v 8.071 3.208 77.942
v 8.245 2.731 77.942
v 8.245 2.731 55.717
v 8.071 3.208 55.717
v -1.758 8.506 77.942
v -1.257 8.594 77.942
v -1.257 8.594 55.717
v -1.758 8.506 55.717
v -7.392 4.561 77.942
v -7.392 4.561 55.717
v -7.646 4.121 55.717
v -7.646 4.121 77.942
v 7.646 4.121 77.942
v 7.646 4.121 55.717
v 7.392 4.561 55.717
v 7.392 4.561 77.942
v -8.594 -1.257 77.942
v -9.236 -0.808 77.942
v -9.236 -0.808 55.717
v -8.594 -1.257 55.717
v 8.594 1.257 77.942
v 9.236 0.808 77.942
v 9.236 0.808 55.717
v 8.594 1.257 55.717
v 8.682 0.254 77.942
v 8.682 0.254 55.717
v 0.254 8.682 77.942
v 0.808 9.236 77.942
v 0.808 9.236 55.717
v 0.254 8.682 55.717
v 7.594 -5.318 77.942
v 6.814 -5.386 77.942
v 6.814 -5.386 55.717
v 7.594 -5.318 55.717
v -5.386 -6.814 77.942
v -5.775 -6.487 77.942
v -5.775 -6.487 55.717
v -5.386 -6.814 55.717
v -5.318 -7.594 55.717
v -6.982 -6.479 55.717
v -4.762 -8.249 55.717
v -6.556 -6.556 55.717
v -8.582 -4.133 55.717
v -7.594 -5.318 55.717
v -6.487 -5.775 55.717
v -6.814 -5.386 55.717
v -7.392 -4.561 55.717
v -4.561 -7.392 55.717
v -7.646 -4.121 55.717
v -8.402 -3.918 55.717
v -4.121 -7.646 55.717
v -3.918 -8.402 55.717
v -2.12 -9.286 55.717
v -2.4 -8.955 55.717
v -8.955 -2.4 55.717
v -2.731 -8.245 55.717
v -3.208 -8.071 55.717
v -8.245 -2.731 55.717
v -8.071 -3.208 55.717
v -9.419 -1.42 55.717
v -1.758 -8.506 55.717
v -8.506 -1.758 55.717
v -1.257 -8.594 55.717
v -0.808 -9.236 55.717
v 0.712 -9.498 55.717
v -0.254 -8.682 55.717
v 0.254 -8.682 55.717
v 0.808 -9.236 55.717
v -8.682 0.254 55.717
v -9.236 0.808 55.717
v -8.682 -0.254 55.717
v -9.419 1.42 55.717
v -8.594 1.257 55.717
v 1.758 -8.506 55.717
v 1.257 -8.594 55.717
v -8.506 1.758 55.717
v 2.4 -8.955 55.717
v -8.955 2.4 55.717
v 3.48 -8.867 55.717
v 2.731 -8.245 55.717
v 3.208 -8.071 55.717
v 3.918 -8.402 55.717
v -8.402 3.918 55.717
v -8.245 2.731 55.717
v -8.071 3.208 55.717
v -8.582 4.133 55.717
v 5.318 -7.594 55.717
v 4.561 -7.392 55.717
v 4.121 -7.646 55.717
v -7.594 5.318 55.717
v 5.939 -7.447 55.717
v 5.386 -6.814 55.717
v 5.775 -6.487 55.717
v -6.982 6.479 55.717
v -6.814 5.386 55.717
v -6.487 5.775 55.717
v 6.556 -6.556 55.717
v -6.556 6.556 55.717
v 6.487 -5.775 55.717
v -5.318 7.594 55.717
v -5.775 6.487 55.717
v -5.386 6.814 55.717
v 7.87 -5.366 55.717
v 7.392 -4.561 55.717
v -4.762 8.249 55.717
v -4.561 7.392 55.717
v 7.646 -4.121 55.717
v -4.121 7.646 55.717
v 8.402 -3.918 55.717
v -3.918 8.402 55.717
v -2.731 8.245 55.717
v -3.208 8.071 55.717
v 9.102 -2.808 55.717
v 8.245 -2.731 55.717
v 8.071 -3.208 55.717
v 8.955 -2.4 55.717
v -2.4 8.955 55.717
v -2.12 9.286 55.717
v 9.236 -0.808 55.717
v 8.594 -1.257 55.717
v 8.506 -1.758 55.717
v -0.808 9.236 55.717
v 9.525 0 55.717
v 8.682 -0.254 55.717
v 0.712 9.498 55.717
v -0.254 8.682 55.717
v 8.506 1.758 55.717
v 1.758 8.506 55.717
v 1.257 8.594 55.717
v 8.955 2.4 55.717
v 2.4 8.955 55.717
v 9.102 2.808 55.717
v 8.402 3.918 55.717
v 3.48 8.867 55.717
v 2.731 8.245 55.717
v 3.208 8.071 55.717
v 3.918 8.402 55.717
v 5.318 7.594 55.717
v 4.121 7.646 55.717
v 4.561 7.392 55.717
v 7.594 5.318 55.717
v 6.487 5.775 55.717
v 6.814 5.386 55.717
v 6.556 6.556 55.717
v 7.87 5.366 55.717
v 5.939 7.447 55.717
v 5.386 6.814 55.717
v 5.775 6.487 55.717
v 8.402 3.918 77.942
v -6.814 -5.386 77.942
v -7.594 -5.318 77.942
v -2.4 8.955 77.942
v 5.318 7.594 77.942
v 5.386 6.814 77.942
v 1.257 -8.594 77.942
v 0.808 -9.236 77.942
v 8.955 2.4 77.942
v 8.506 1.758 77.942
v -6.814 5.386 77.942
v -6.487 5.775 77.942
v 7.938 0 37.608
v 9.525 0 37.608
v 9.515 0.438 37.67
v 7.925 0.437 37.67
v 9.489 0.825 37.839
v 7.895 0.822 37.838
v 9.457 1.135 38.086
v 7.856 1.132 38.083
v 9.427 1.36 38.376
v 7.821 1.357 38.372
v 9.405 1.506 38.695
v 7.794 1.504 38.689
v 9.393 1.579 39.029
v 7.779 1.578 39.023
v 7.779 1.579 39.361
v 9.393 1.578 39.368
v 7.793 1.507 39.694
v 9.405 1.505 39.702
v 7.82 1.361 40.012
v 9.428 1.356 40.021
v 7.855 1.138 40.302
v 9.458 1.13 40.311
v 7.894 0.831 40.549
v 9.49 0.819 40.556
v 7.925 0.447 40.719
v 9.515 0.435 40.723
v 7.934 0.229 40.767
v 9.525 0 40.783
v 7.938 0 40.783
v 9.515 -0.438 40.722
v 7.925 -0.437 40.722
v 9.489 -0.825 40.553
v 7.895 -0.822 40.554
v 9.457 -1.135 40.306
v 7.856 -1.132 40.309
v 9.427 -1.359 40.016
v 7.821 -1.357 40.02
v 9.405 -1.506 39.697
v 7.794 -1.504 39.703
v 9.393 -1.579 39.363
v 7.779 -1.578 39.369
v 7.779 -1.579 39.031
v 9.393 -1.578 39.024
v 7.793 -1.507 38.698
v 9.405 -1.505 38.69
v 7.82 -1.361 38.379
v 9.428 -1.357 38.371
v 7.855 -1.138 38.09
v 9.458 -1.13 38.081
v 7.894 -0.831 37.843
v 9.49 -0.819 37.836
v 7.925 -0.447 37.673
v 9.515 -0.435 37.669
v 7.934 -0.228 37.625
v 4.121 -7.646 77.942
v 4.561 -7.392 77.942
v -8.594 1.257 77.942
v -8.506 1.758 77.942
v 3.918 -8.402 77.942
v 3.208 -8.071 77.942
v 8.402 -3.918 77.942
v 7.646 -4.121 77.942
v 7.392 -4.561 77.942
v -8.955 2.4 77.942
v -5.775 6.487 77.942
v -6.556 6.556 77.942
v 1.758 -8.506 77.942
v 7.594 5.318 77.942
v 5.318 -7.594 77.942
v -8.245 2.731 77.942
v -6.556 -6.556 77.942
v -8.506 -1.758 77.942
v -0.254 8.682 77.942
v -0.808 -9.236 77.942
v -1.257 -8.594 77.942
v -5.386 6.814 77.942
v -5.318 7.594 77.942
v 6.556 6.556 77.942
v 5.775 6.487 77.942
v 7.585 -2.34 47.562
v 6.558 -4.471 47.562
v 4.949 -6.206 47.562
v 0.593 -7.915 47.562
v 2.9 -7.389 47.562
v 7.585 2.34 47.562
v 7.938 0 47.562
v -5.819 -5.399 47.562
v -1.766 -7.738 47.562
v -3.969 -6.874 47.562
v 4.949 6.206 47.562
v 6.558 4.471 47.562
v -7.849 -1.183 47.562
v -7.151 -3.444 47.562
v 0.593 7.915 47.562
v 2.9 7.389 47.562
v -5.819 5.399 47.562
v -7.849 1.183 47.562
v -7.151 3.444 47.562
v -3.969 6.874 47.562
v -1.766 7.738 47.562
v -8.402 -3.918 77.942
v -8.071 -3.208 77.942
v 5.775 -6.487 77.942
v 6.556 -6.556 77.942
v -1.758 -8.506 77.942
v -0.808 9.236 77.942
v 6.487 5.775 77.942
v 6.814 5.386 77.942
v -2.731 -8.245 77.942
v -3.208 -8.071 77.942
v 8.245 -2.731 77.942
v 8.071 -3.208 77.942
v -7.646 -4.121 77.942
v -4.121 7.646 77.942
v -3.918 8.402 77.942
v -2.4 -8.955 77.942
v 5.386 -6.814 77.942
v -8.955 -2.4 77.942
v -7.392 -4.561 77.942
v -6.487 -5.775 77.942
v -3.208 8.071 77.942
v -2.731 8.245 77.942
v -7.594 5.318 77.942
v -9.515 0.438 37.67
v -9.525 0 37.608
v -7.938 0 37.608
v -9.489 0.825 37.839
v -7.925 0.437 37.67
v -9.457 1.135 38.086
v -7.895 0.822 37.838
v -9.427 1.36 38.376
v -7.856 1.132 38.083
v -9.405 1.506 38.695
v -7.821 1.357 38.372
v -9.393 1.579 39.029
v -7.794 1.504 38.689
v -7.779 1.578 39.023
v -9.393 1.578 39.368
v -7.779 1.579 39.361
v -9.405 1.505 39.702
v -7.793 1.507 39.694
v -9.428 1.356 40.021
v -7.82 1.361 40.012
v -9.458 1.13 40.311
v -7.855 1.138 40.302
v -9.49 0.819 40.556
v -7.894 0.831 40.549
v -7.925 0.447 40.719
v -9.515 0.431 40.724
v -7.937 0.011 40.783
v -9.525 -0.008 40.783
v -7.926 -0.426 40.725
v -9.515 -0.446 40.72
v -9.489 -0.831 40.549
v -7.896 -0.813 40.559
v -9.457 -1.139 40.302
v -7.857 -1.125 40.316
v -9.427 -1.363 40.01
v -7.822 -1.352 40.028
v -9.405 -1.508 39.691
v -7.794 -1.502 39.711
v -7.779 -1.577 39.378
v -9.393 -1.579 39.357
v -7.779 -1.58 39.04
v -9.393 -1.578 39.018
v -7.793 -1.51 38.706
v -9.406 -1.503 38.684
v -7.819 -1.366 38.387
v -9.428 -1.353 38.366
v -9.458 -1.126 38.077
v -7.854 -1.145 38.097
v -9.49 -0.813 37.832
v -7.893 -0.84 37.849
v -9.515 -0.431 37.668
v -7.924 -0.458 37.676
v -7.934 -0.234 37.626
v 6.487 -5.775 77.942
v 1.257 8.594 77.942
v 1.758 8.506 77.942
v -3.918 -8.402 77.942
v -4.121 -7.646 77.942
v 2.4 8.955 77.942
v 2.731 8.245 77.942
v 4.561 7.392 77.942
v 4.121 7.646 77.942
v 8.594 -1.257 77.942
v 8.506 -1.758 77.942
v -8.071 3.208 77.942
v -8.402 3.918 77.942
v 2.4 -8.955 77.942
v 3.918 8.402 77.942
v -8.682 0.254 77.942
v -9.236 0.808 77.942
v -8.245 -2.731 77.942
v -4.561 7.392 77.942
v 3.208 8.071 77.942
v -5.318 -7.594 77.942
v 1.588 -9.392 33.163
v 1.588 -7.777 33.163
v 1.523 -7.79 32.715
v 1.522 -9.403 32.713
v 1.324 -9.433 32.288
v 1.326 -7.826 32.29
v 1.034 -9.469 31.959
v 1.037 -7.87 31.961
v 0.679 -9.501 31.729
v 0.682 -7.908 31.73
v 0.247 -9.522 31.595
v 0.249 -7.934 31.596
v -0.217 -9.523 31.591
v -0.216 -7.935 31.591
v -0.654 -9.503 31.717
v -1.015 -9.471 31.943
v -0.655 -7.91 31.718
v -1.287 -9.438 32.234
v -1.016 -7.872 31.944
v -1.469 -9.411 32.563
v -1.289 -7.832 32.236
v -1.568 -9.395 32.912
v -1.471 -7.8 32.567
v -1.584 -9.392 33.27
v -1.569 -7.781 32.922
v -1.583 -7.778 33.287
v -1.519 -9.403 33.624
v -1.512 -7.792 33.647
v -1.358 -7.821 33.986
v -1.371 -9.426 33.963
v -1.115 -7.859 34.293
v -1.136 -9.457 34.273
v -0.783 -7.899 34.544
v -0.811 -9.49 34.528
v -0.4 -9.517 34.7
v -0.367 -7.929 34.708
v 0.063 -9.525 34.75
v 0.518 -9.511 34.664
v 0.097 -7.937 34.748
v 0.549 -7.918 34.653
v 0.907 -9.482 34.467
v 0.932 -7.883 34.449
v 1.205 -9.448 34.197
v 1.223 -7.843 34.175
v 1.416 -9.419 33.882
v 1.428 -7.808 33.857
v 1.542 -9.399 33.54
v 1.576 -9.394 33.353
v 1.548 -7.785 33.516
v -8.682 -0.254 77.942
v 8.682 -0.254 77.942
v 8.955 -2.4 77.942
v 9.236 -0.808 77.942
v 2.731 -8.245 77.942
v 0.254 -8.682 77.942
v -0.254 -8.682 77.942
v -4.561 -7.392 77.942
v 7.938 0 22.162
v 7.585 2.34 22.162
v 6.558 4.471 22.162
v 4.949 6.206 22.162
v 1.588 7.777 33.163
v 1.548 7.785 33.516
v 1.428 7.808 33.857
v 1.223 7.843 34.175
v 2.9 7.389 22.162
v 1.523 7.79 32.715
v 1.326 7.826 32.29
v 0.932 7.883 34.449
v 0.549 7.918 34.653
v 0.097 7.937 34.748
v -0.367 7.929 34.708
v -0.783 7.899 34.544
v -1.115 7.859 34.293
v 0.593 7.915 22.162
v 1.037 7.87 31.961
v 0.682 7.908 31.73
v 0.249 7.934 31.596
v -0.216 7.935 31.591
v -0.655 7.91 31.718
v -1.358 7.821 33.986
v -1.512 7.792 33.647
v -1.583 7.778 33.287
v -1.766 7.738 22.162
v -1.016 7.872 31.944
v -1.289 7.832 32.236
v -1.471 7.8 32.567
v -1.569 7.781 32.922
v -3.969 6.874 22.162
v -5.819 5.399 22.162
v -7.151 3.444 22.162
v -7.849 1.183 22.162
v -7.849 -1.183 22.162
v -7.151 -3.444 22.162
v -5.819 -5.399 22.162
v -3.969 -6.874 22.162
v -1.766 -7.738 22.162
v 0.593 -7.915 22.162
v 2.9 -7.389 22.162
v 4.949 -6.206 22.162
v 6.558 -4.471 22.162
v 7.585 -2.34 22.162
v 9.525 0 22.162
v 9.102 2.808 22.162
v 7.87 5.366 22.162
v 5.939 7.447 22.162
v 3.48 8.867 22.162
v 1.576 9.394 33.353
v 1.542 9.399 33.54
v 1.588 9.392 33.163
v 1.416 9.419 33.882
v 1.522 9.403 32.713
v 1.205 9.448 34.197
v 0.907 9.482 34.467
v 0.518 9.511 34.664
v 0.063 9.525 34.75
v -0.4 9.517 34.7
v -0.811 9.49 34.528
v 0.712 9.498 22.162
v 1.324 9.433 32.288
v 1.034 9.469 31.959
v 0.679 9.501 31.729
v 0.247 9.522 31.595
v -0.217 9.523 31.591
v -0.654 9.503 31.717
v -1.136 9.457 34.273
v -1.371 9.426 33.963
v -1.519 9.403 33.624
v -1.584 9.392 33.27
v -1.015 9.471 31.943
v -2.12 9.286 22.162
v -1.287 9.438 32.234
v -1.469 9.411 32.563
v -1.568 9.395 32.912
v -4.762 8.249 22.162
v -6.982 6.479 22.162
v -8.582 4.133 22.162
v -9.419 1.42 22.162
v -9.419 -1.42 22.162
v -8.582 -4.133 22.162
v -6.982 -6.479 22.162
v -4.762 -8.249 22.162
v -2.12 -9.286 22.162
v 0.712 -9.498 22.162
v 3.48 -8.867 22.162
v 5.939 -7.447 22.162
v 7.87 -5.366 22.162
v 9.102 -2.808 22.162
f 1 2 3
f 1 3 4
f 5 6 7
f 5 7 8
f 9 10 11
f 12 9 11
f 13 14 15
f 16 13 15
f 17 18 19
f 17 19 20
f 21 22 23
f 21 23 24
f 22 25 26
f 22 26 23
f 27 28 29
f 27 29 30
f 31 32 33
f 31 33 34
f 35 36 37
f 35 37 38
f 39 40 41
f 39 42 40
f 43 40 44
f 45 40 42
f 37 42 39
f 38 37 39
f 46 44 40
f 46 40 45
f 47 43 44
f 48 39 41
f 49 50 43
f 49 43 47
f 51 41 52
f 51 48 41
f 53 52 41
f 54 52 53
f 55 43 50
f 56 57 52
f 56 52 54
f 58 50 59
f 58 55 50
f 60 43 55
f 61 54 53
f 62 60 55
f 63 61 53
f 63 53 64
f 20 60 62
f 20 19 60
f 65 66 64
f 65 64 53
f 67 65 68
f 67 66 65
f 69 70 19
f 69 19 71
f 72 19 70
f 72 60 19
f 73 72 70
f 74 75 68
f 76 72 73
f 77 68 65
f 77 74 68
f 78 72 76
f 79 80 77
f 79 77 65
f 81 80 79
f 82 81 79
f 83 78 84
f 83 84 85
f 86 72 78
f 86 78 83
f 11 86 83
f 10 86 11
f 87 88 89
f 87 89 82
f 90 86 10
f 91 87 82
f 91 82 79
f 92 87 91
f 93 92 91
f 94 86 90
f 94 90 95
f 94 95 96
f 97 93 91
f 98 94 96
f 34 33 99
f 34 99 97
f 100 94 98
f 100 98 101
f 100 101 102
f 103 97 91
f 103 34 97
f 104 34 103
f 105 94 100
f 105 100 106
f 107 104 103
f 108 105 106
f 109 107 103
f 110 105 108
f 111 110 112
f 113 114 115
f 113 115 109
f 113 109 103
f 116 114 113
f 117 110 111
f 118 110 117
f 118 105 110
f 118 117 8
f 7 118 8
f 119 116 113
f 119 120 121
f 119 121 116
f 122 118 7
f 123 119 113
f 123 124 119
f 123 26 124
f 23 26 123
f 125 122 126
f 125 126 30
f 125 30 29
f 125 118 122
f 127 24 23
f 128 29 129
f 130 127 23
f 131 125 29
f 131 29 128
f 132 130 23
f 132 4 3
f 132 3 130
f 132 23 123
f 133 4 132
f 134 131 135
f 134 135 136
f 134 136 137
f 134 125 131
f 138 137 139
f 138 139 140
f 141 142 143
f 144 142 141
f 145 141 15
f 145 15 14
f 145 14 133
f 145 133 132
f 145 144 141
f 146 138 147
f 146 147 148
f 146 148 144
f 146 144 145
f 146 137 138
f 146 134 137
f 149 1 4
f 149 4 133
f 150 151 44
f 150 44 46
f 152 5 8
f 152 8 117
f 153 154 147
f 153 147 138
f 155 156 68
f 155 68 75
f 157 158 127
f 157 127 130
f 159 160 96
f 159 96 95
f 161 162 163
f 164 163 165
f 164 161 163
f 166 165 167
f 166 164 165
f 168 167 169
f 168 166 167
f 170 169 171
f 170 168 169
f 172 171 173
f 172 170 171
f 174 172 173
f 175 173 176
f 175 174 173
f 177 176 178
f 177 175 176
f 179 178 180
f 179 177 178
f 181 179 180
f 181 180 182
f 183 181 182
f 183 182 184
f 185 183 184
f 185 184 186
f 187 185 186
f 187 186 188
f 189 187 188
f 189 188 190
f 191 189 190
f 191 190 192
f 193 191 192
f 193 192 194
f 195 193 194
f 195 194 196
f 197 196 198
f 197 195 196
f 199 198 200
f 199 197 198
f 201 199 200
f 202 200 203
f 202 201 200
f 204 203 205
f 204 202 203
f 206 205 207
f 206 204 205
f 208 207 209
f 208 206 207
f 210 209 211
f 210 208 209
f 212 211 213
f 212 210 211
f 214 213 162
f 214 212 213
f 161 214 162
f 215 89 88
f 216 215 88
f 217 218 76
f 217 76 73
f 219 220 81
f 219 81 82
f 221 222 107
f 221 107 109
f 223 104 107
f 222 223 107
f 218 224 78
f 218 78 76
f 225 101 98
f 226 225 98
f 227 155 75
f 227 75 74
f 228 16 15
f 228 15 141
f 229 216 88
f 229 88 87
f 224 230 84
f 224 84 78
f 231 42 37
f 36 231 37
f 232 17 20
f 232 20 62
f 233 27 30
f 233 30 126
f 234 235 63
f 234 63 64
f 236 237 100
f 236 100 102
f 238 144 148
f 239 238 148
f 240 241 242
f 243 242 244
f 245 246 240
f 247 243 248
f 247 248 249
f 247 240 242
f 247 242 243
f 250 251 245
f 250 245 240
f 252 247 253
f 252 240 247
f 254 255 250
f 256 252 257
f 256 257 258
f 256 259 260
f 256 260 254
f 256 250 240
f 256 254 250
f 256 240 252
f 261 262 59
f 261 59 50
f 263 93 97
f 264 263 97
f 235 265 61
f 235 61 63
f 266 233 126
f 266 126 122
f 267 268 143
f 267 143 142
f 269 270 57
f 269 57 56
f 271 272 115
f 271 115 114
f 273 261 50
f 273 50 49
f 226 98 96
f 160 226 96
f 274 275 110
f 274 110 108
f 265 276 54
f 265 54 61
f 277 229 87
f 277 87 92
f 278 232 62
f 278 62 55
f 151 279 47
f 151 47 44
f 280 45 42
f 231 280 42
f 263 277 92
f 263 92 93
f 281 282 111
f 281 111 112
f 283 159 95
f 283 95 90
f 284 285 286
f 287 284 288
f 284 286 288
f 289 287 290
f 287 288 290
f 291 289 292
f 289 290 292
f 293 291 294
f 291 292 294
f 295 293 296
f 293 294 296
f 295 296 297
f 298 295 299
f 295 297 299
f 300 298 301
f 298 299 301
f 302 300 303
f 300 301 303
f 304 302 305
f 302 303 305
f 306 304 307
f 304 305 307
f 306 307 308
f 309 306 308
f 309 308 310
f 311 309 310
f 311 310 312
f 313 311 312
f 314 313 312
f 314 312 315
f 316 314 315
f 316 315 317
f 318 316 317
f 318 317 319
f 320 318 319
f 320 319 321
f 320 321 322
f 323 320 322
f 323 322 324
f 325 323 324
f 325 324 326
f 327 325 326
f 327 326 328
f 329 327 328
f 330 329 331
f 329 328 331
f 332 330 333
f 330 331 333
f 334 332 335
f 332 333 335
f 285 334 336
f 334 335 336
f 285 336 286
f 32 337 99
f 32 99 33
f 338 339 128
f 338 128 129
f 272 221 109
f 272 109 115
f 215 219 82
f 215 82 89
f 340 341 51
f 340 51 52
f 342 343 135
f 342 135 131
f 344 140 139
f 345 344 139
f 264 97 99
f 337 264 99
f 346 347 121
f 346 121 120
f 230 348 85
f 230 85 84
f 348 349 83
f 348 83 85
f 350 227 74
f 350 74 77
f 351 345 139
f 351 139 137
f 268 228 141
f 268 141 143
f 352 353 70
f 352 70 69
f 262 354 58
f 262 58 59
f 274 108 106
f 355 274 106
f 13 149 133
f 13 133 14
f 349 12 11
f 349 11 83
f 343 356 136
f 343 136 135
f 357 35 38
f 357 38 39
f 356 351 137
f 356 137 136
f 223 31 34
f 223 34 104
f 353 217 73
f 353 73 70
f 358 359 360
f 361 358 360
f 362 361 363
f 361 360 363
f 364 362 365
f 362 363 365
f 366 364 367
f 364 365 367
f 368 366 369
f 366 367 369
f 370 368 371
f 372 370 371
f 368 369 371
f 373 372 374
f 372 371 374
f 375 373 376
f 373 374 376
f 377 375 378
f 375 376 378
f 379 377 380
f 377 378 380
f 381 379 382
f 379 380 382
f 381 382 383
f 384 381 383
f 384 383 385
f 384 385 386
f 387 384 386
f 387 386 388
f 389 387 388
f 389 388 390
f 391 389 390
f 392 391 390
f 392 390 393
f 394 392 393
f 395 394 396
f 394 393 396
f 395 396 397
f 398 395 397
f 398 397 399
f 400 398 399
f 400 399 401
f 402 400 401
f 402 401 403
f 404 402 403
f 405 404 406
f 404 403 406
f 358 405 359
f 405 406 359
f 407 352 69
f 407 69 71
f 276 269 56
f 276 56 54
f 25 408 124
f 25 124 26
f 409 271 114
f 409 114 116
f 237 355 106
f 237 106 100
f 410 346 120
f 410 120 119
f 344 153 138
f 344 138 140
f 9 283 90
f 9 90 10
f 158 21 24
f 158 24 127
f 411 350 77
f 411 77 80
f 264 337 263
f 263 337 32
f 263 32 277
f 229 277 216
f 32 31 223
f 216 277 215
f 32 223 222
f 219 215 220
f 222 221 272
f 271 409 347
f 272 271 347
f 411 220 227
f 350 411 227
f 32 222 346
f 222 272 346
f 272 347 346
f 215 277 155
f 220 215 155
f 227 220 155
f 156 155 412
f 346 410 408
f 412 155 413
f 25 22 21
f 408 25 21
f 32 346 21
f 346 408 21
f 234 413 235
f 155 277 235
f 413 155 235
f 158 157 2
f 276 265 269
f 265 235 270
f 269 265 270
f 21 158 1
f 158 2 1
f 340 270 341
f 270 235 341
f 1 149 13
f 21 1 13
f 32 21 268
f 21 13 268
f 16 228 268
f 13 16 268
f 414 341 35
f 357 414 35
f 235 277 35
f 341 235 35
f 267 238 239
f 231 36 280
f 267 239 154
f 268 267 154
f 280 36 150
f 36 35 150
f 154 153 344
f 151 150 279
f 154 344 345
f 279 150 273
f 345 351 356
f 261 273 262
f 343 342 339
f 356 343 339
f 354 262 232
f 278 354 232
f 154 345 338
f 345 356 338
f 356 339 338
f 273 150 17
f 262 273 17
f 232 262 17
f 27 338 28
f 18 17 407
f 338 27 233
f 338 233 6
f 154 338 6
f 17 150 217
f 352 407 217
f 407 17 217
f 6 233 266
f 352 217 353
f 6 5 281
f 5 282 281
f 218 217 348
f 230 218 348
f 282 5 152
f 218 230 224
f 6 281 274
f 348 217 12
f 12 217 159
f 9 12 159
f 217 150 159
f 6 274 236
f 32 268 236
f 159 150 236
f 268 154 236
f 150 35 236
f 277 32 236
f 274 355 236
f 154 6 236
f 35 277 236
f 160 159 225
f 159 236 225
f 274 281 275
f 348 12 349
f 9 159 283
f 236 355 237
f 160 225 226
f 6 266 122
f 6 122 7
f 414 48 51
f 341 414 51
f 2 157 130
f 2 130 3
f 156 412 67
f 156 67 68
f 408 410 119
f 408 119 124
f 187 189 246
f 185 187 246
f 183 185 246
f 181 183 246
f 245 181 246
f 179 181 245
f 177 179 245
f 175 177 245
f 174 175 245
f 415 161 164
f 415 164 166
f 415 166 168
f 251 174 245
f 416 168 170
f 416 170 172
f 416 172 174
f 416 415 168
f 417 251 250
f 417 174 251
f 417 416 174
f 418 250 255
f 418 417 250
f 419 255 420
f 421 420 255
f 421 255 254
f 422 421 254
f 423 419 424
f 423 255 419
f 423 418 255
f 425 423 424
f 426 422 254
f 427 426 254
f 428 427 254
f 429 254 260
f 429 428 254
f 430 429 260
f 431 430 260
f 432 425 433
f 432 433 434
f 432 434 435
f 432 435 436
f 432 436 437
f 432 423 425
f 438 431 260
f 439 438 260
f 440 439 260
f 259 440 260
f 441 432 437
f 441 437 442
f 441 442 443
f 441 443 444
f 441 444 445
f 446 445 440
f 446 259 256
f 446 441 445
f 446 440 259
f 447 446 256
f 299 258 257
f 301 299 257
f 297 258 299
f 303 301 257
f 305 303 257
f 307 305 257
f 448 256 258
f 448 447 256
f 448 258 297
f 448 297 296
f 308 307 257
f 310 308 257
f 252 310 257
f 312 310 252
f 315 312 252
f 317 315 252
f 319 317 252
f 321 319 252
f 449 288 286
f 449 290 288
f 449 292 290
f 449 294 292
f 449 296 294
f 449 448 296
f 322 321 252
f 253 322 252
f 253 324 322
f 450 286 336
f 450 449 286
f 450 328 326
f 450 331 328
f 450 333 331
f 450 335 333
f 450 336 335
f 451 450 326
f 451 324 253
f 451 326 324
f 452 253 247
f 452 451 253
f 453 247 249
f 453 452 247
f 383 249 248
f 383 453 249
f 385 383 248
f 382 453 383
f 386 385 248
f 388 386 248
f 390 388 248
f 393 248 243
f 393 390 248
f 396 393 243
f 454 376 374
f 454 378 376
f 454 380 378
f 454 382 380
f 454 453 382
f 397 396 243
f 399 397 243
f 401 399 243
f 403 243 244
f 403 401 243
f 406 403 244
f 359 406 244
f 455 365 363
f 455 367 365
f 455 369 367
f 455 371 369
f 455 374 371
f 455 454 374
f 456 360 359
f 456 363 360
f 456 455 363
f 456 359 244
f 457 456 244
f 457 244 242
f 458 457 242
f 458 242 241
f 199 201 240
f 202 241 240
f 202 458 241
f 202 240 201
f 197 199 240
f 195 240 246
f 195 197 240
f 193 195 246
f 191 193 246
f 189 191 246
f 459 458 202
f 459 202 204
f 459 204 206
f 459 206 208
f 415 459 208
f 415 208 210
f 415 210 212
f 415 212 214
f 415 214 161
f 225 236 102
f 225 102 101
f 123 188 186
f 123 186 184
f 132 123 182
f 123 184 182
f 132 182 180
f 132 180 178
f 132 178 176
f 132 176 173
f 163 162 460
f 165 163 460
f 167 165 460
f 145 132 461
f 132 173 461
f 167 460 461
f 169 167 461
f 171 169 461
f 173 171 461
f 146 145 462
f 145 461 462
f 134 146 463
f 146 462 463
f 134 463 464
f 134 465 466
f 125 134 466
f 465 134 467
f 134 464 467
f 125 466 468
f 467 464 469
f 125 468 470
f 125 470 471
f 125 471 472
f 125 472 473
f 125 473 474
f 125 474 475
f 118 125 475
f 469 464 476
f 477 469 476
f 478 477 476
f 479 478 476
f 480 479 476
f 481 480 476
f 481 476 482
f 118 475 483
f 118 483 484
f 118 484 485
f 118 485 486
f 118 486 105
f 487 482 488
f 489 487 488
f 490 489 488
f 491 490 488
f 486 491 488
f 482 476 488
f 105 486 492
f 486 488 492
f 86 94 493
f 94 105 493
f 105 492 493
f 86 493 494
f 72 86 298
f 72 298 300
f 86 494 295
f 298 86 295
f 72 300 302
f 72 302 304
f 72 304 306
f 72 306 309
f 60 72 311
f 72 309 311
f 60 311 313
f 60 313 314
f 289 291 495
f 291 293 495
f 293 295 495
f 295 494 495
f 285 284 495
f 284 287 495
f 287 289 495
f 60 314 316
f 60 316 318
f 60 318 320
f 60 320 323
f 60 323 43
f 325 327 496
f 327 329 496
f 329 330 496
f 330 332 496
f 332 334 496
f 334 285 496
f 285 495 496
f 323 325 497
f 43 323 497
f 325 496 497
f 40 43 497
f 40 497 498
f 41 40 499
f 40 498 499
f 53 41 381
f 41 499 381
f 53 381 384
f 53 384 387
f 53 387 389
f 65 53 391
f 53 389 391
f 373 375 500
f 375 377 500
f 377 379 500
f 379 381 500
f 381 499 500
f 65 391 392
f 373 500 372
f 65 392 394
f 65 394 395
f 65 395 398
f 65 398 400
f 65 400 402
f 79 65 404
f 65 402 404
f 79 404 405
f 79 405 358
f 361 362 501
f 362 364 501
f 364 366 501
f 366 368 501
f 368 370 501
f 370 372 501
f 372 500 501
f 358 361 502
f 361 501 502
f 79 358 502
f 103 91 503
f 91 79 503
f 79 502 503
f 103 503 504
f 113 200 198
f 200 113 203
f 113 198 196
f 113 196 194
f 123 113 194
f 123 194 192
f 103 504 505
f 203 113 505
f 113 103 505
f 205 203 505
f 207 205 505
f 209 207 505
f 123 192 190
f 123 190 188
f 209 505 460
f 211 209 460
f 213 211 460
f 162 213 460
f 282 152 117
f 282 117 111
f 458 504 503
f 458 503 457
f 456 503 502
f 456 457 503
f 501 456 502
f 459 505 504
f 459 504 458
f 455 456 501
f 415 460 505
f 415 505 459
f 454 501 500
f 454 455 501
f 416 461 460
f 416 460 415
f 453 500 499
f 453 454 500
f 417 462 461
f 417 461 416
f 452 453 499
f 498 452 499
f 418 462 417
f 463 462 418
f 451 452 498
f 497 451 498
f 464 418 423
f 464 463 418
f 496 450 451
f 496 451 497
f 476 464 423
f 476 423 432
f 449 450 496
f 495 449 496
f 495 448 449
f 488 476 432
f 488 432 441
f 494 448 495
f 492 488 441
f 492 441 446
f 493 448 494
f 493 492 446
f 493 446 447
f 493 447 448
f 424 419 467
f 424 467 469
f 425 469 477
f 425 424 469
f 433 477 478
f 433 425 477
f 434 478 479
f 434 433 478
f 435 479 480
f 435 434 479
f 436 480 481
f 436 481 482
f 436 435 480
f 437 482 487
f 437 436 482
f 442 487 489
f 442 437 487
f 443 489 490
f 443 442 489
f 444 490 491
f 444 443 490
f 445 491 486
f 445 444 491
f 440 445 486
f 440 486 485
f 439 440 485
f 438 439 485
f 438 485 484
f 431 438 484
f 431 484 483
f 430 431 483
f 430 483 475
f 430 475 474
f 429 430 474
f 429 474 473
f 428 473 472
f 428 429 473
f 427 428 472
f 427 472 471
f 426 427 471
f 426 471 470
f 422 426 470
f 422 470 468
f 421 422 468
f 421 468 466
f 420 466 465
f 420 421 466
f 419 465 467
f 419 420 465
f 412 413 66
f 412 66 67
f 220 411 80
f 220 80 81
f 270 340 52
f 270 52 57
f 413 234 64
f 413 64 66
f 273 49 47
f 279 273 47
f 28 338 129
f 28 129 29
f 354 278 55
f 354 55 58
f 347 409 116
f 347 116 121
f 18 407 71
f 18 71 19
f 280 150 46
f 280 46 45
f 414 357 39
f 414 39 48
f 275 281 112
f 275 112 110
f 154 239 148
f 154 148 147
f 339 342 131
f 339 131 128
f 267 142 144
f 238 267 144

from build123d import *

# Parameters (mm, degrees)
SKETCH5_W               = 1.587499994
SKETCH5_H               = 55.780081988
SKETCH7_R               = 1.5875
CUT_EXTRUDE5_DEPTH      = 10.524999994
CUT_EXTRUDE5_DEPTH_BACK = 10.524999994
SKETCH6_R               = 1.5875
CUT_EXTRUDE6_DEPTH      = 10.525000094
CUT_EXTRUDE6_DEPTH_BACK = 10.525000094
CUT_EXTRUDE7_START      = 77.941582
SKETCH8_R               = 12.7
CUT_EXTRUDE7_DEPTH      = 22.225
SKETCH10_R              = 7.9375
BOSS_EXTRUDE1_DEPTH     = 30.380082


with BuildPart() as part:
    # Sketch5 → Revolve2 (revolve)
    with BuildSketch(Plane(origin=(0, 0, 0), x_dir=(1, 0, 0), z_dir=(0, 1, 0))):
        with Locations((8.731249997, -50.051540994)):
            Rectangle(SKETCH5_W, SKETCH5_H)
    revolve(axis=Axis((0, 0, 0), (0, 0, 1)))

    # Sketch7 → Cut-Extrude5 (cut, two sides)
    with BuildSketch(Plane(origin=(0, 0, 0), x_dir=(0, 0, -1), z_dir=(1, 0, 0))) as cut_extrude5_sk:
        with Locations((-39.195999993, 0)):
            Circle(SKETCH7_R)
    extrude(amount=CUT_EXTRUDE5_DEPTH, mode=Mode.SUBTRACT)
    extrude(cut_extrude5_sk.sketch, amount=-CUT_EXTRUDE5_DEPTH_BACK, mode=Mode.SUBTRACT)

    # Sketch6 → Cut-Extrude6 (cut, two sides)
    with BuildSketch(Plane(origin=(0, 0, 0), x_dir=(1, 0, 0), z_dir=(0, 1, 0))) as cut_extrude6_sk:
        with Locations((1e-09, -33.163499999)):
            Circle(SKETCH6_R)
    extrude(amount=CUT_EXTRUDE6_DEPTH, mode=Mode.SUBTRACT)
    extrude(cut_extrude6_sk.sketch, amount=-CUT_EXTRUDE6_DEPTH_BACK, mode=Mode.SUBTRACT)

    # Sketch8 → Cut-Extrude7 (cut)
    with BuildSketch(Plane.XY.offset(CUT_EXTRUDE7_START)):
        Circle(SKETCH8_R)
        Polygon((9.235721046, -0.808020891), (8.681700155, -0.254), (8.681700155, 0.254), (9.235721046, 0.808020891), (8.593912259, 1.257420242), (8.505698985, 1.75770258), (8.955098336, 2.399511367), (8.245002688, 2.730634406), (8.071256455, 3.207998257), (8.402379494, 3.918093905), (7.645572882, 4.120879625), (7.391572882, 4.56082053), (7.594358603, 5.317627141), (6.813836213, 5.385914002), (6.487300108, 5.775064579), (6.555586968, 6.555586968), (5.775064579, 6.487300108), (5.385914002, 6.813836213), (5.317627141, 7.594358603), (4.56082053, 7.391572882), (4.120879625, 7.645572882), (3.918093905, 8.402379494), (3.207998257, 8.071256455), (2.730634406, 8.245002688), (2.399511367, 8.955098336), (1.75770258, 8.505698985), (1.257420242, 8.593912259), (0.808020891, 9.235721046), (0.254, 8.681700155), (-0.254, 8.681700155), (-0.808020891, 9.235721046), (-1.257420242, 8.593912259), (-1.75770258, 8.505698985), (-2.399511367, 8.955098336), (-2.730634406, 8.245002688), (-3.207998257, 8.071256455), (-3.918093905, 8.402379494), (-4.120879625, 7.645572882), (-4.56082053, 7.391572882), (-5.317627141, 7.594358603), (-5.385914002, 6.813836213), (-5.775064579, 6.487300108), (-6.555586968, 6.555586968), (-6.487300108, 5.775064579), (-6.813836213, 5.385914002), (-7.594358603, 5.317627141), (-7.391572882, 4.56082053), (-7.645572882, 4.120879625), (-8.402379494, 3.918093905), (-8.071256455, 3.207998257), (-8.245002688, 2.730634406), (-8.955098336, 2.399511367), (-8.505698985, 1.75770258), (-8.593912259, 1.257420242), (-9.235721046, 0.808020891), (-8.681700155, 0.254), (-8.681700155, -0.254), (-9.235721046, -0.808020891), (-8.593912259, -1.257420242), (-8.505698985, -1.75770258), (-8.955098336, -2.399511367), (-8.245002688, -2.730634406), (-8.071256455, -3.207998257), (-8.402379494, -3.918093905), (-7.645572882, -4.120879625), (-7.391572882, -4.56082053), (-7.594358603, -5.317627141), (-6.813836213, -5.385914002), (-6.487300108, -5.775064579), (-6.555586968, -6.555586968), (-5.775064579, -6.487300108), (-5.385914002, -6.813836213), (-5.317627141, -7.594358603), (-4.56082053, -7.391572882), (-4.120879625, -7.645572882), (-3.918093905, -8.402379494), (-3.207998257, -8.071256455), (-2.730634406, -8.245002688), (-2.399511367, -8.955098336), (-1.75770258, -8.505698985), (-1.257420242, -8.593912259), (-0.808020891, -9.235721046), (-0.254, -8.681700155), (0.254, -8.681700155), (0.808020891, -9.235721046), (1.257420242, -8.593912259), (1.75770258, -8.505698985), (2.399511367, -8.955098336), (2.730634406, -8.245002688), (3.207998257, -8.071256455), (3.918093905, -8.402379494), (4.120879625, -7.645572882), (4.56082053, -7.391572882), (5.317627141, -7.594358603), (5.385914002, -6.813836213), (5.775064579, -6.487300108), (6.555586968, -6.555586968), (6.487300108, -5.775064579), (6.813836213, -5.385914002), (7.594358603, -5.317627141), (7.391572882, -4.56082053), (7.645572882, -4.120879625), (8.402379494, -3.918093905), (8.071256455, -3.207998257), (8.245002688, -2.730634406), (8.955098336, -2.399511367), (8.505698985, -1.75770258), (8.593912259, -1.257420242), align=None, mode=Mode.SUBTRACT)
    extrude(amount=-CUT_EXTRUDE7_DEPTH, mode=Mode.SUBTRACT)

    # Sketch10 → Boss-Extrude1 (add)
    with BuildSketch(Plane(origin=(0, 0, 47.5615), x_dir=(-1, 0, 0), z_dir=(0, 0, -1))):
        Circle(SKETCH10_R)
    extrude(amount=-BOSS_EXTRUDE1_DEPTH)


solid = part.part
